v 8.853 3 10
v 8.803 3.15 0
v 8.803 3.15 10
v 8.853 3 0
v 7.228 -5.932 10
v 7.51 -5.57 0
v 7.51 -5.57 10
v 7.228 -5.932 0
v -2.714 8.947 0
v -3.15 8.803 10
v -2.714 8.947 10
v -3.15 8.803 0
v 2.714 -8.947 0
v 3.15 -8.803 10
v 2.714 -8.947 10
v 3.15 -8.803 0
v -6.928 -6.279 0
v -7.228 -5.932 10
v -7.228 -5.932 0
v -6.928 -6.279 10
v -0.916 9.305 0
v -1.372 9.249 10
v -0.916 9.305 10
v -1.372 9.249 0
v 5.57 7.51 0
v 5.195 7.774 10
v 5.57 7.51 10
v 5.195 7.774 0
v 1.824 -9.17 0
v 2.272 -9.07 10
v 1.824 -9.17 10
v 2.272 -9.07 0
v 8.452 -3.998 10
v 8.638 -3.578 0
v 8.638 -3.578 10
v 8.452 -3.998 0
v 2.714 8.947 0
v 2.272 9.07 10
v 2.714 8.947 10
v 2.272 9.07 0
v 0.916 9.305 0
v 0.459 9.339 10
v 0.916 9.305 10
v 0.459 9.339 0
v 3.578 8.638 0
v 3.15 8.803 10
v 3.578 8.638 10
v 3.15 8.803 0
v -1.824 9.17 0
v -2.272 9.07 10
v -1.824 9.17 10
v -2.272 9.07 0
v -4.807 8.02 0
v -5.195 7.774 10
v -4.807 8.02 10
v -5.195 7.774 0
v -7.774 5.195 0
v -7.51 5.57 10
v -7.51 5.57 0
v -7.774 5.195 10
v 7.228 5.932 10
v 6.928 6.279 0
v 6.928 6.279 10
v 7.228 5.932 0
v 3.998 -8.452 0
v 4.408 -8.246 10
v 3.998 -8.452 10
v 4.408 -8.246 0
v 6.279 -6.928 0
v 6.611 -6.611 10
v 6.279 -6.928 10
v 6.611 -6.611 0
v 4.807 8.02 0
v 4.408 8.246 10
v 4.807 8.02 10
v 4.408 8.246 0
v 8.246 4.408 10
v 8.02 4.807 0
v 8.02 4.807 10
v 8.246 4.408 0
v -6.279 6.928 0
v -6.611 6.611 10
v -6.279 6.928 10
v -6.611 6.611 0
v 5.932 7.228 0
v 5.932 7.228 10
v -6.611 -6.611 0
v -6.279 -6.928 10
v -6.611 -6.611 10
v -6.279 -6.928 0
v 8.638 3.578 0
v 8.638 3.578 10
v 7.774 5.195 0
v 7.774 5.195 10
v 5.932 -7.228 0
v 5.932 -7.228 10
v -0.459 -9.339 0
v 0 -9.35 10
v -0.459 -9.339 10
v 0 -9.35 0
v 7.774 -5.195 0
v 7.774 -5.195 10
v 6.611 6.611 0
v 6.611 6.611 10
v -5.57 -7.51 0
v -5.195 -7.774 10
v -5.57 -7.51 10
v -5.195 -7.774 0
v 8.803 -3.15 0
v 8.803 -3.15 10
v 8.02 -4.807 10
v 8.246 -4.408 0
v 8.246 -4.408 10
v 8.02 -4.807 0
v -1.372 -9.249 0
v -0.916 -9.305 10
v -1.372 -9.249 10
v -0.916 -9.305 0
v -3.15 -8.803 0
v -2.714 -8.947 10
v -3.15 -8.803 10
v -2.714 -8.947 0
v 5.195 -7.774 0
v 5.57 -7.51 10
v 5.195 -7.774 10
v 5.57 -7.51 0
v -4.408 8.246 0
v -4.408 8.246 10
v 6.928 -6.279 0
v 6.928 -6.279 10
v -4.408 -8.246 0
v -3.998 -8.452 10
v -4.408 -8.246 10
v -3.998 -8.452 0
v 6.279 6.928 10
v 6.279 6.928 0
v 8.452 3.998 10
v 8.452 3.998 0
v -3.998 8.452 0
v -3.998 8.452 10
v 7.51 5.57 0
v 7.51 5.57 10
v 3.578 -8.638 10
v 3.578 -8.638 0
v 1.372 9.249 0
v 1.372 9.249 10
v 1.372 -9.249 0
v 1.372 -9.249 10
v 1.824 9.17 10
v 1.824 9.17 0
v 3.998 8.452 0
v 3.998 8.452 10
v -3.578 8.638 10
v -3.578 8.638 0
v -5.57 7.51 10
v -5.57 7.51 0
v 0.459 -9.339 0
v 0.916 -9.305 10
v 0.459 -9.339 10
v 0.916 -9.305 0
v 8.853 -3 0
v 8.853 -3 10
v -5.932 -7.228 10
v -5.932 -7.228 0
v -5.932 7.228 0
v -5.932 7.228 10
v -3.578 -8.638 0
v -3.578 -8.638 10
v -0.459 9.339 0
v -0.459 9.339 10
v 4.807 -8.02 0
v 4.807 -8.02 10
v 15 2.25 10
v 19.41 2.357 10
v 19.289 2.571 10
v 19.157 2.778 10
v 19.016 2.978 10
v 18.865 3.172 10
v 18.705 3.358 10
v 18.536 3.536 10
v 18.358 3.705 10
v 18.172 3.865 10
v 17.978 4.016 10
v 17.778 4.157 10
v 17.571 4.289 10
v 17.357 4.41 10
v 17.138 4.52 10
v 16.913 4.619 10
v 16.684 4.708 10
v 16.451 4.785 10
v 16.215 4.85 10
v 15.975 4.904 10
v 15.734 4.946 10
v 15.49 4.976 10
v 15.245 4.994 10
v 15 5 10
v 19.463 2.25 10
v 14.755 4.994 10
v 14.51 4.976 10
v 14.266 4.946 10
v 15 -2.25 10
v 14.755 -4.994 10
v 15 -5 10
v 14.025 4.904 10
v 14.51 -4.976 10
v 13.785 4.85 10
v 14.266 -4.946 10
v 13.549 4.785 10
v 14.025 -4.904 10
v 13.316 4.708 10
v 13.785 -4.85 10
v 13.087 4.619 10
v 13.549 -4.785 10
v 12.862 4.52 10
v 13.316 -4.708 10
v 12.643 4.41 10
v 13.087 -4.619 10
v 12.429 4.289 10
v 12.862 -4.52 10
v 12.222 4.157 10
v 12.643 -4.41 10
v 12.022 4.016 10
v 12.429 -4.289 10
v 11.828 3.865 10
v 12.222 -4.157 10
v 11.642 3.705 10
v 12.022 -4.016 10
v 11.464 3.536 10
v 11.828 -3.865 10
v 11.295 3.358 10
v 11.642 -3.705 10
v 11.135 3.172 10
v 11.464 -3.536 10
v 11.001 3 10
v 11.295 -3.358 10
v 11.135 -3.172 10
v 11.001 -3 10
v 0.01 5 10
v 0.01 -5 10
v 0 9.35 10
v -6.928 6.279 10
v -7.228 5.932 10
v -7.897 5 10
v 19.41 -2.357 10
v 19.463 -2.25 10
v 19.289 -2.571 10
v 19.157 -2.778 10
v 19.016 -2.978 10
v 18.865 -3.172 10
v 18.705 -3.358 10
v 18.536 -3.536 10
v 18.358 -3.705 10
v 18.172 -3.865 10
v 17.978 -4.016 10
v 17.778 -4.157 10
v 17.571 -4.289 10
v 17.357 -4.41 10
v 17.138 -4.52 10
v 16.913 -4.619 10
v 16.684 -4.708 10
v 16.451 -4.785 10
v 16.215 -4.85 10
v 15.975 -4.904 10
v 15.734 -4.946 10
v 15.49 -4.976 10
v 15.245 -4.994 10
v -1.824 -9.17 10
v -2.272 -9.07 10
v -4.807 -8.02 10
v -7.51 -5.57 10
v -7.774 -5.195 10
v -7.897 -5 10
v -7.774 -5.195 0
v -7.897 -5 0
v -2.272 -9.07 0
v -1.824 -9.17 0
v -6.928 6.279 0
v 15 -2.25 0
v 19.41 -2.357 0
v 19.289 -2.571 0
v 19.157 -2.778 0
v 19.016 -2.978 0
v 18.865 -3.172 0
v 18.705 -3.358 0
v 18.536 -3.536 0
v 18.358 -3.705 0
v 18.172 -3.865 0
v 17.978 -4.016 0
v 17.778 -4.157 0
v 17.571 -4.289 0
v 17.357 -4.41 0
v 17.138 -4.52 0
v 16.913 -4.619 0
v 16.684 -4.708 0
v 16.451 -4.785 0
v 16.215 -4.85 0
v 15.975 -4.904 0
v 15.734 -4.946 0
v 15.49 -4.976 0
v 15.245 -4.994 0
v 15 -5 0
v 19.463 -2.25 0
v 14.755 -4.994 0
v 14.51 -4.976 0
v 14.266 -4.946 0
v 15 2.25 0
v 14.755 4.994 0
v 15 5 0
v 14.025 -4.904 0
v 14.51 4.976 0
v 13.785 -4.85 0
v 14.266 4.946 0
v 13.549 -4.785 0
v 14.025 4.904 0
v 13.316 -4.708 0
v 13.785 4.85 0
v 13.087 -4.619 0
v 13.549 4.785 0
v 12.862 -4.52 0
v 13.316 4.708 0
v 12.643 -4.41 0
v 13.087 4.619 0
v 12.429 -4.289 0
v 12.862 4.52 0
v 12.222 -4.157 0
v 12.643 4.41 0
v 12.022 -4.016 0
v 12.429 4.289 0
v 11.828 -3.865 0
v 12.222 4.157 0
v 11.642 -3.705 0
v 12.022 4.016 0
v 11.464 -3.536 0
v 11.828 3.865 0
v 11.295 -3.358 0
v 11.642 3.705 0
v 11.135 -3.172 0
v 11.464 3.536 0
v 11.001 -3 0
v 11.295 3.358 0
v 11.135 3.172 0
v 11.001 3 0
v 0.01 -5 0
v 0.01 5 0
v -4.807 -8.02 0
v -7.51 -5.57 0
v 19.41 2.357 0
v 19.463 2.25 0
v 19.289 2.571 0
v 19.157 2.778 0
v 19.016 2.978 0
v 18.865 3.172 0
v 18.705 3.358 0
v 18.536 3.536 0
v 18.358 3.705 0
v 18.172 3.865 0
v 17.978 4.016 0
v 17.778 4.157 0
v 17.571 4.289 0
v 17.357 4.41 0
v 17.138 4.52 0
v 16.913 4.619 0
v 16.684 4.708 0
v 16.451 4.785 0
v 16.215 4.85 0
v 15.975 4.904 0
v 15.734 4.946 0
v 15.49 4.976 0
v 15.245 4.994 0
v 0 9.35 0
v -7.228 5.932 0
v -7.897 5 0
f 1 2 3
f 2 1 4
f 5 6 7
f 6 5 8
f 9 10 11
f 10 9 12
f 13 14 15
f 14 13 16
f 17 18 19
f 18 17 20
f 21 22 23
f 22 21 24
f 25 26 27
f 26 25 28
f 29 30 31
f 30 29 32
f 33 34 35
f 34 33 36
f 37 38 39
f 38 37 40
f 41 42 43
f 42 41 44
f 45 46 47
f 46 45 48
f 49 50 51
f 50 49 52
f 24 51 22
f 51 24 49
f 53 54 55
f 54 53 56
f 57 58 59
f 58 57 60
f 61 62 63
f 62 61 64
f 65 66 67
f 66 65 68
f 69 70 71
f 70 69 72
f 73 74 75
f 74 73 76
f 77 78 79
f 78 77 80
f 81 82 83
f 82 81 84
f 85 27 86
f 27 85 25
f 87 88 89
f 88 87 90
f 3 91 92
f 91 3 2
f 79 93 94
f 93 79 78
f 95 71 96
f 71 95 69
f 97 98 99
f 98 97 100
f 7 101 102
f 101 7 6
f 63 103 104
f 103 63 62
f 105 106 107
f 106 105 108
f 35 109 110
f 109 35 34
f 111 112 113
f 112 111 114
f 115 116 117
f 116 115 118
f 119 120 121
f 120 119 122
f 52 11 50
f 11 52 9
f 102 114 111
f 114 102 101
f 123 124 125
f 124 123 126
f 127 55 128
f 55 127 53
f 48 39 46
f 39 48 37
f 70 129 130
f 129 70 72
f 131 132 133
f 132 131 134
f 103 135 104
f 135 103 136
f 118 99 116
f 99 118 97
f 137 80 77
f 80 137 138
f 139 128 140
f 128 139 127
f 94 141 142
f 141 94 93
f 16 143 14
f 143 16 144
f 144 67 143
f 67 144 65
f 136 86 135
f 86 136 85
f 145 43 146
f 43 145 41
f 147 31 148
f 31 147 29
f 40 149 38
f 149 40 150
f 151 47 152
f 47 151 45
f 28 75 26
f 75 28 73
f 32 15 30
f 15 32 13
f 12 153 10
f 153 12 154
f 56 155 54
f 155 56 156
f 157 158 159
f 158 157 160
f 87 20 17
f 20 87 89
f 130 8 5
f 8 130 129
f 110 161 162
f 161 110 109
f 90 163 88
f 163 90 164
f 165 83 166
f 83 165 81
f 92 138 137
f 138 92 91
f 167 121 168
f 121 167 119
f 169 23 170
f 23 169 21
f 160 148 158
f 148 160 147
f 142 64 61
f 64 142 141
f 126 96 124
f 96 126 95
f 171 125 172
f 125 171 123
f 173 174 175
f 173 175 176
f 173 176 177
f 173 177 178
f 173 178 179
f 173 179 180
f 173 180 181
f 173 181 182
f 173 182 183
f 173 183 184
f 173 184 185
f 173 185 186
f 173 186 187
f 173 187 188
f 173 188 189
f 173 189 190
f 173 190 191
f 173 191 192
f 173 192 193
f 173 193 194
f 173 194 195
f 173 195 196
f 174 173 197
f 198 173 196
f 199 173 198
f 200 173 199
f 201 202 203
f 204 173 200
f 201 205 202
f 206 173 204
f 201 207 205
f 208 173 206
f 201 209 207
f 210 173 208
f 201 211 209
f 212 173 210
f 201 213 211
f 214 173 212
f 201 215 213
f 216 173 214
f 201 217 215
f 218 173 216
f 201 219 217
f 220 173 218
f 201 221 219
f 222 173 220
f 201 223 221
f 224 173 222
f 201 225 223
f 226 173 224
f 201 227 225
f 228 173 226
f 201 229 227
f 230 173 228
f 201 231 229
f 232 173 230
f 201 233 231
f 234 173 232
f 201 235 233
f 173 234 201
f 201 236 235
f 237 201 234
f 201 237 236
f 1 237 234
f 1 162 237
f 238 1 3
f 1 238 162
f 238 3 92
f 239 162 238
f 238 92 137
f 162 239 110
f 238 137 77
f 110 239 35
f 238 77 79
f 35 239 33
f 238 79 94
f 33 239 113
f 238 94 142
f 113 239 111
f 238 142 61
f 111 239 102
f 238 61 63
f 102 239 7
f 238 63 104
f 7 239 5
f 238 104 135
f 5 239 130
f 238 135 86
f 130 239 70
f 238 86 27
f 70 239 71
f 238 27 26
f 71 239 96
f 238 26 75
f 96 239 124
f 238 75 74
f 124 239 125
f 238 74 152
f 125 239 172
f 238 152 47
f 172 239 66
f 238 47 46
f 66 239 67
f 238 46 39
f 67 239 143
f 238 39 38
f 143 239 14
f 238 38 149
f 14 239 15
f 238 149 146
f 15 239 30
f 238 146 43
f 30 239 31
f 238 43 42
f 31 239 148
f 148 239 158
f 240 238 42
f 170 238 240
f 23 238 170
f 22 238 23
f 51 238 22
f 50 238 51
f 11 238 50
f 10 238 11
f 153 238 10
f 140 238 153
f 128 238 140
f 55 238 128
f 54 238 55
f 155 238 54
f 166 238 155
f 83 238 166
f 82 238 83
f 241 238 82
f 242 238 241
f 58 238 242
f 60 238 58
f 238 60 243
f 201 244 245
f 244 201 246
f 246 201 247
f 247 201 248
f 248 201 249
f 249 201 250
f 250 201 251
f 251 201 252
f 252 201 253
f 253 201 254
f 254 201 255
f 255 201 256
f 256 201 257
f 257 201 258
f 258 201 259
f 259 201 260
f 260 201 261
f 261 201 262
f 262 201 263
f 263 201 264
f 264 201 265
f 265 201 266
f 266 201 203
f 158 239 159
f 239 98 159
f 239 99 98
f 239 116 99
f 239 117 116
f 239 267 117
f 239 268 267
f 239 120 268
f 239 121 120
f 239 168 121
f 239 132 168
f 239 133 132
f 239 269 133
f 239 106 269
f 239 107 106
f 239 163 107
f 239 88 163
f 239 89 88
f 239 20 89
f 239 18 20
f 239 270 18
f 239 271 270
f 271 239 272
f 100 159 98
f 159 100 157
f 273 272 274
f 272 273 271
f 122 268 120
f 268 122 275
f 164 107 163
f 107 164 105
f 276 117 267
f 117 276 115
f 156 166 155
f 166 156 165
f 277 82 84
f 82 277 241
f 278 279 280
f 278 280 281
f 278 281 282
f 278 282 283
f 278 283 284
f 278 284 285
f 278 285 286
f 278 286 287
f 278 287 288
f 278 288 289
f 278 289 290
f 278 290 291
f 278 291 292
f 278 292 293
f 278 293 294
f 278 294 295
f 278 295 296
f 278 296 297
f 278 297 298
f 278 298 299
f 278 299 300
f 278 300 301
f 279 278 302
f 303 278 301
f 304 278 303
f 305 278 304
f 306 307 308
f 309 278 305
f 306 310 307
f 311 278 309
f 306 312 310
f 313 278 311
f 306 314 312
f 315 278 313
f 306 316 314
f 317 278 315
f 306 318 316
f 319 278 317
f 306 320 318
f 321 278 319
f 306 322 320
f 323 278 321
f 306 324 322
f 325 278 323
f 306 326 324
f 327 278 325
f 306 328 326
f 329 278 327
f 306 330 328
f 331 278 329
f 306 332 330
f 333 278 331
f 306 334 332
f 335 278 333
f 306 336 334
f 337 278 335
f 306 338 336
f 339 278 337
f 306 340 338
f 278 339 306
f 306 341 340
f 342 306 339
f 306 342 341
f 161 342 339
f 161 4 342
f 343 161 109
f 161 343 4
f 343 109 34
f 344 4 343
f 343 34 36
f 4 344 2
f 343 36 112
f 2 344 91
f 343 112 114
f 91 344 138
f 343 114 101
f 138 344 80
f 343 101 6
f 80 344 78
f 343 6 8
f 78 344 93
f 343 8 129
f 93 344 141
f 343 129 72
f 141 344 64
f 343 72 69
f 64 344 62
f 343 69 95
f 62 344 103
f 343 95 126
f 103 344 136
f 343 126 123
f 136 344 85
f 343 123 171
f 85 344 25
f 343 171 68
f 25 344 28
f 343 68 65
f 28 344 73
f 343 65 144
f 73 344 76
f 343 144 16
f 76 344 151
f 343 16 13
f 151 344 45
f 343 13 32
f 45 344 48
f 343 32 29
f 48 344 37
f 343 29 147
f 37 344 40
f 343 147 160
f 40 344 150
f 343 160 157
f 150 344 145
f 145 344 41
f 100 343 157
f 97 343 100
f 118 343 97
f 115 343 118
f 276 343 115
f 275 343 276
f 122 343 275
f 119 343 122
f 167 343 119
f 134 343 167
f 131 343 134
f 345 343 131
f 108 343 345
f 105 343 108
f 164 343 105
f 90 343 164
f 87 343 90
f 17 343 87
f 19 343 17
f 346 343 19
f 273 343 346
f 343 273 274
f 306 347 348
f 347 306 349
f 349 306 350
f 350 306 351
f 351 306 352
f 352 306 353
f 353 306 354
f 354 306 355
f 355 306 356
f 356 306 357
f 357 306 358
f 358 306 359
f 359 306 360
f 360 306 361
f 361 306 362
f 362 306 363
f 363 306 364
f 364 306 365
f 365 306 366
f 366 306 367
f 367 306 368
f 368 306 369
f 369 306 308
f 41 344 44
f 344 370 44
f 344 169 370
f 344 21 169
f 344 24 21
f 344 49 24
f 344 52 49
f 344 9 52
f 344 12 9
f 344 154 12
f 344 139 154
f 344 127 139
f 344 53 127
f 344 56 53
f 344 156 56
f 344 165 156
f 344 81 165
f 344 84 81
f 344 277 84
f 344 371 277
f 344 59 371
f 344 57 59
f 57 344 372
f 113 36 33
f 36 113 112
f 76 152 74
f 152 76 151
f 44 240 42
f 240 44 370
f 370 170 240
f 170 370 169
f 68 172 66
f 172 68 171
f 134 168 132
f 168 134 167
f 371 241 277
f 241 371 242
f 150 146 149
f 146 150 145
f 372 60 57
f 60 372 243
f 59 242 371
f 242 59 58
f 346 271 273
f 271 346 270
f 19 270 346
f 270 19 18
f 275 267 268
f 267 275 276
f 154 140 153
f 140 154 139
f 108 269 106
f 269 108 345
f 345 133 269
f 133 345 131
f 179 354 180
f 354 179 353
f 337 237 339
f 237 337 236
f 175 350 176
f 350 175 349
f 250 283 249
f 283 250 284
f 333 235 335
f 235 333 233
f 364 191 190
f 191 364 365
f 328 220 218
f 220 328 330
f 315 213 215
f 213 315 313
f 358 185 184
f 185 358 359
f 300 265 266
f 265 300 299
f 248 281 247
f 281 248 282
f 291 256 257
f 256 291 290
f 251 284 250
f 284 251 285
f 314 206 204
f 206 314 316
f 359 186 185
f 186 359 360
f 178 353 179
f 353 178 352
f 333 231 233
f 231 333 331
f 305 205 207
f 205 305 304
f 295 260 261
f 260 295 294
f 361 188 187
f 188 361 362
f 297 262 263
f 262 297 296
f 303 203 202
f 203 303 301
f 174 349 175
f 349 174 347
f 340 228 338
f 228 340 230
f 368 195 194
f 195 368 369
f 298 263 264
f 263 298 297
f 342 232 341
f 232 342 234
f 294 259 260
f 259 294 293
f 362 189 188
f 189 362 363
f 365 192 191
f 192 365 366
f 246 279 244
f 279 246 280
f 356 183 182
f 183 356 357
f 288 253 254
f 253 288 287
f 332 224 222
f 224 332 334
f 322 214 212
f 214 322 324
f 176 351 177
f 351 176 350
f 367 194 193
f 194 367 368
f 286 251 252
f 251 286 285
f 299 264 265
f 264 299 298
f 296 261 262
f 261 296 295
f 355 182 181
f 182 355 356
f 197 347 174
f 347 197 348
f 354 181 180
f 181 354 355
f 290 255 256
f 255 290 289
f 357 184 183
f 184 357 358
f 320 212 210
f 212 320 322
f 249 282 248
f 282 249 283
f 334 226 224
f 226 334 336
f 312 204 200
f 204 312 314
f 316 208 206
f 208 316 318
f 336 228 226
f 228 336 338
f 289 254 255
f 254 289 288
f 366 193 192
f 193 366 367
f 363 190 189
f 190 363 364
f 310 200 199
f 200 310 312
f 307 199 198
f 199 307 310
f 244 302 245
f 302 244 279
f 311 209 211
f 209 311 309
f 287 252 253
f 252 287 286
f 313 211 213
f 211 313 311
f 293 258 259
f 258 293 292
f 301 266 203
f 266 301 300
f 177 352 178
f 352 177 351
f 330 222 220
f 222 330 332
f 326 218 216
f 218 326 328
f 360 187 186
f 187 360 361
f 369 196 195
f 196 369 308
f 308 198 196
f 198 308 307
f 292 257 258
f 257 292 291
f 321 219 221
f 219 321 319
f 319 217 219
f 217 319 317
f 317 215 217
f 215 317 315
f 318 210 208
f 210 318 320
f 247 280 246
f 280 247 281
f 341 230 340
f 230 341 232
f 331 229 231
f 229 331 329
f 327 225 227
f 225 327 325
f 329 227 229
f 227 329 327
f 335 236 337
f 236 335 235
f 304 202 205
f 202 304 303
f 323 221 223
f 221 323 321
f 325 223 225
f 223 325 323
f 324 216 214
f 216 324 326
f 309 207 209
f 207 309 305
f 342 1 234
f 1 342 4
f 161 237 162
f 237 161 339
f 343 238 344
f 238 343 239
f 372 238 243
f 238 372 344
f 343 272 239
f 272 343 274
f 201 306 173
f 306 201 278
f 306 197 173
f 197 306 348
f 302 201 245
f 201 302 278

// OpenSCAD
// Snap-on clip: holds a piece of tubing next to a 12.7 mm lab stand rod
// Printed flat: 2-D profile in XY, extruded 10 mm in +Z

$fn = 128;

// ---------------- Parameters ----------------
rod_d      = 12.7;              // rod ring inner diameter
rod_wall   = 3;                 // rod ring wall thickness
rod_r      = rod_d / 2 + rod_wall; // rod ring outer radius (18.7)

tub_d      = 6;                 // tubing ring inner diameter
tub_wall   = 2;                 // tubing ring wall thickness
tub_r      = tub_d / 2 + tub_wall;   // tubing ring outer radius (5)

bridge_w   = 6;                 // bridge width in X (from x = 8 to x = 12)
bridge_y   = 6;                 // bridge width in Y

open_rod   = 10;                // rod ring opening width (Y: -5 to +5)
open_tub   = 4.5;               // tubing ring opening width (Y: -2.25 to +2.25)

height     = 10;                // extrusion height (Z)

eps        = 0.5;               // overshoot for clean cuts

// ---------------- Derived ----------------
rod_od     = 2 * rod_r;         // 18.7

// ---------------- Model ----------------
difference() {
    union() {
        // Rod ring
        cylinder(d = rod_od, r = rod_r, h = height);
        // Tubing ring
        translate([15, 0, 0])
            cylinder(d = tub_d + 2 * tub_wall, r = tub_r, h = height);
        // Solid bridge between the rings
        translate([8, -bridge_y / 2, 0])
            cube([bridge_w, bridge_y, height]);
    }

    // Rod ring opening: remove everything with x < 0 and -5 < y < 5
    translate([-(rod_r + eps), -open_rod / 2, -eps])
        cube([rod_r + eps + 0.01, open_rod, height + 2 * eps]);

    // Tubing ring opening: remove x > 15 and -2.25 < y < 2.25
    translate([15, -open_tub / 2, -eps])
        cube([tub_r + eps + 0.01, open_tub, height + 2 * eps]);
}
